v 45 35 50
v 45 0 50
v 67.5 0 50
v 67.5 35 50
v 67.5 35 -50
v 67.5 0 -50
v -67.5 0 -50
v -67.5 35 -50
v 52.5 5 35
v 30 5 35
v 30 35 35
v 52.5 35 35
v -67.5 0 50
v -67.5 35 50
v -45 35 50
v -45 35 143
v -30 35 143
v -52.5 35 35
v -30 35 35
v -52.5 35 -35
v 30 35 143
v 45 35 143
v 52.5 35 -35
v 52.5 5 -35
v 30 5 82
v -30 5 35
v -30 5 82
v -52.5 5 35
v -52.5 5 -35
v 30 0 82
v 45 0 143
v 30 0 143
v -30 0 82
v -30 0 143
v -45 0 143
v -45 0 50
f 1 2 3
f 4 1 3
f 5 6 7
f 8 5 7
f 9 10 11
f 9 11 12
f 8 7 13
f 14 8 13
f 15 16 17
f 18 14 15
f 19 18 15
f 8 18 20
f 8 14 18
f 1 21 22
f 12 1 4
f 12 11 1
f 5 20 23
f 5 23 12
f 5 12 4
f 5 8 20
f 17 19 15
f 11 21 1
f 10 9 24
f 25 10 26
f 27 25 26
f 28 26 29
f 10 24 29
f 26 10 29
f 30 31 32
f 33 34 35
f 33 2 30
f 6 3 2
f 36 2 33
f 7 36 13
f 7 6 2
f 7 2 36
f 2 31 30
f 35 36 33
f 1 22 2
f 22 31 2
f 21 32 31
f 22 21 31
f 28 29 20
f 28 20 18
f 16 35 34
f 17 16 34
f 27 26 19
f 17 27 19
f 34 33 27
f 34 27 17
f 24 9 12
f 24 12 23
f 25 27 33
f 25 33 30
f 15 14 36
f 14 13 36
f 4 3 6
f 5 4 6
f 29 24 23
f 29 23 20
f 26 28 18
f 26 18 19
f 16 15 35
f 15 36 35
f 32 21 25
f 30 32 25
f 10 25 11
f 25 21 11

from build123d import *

# Parameters (mm, degrees)
BOSS_EXTRUDE1_DEPTH = 5
BOSS_EXTRUDE2_DEPTH = 30
SKETCH3_W           = 60
SKETCH3_H           = 61
CUT_EXTRUDE1_DEPTH  = 162.957556168


with BuildPart() as part:
    # Sketch1 → Boss-Extrude1 (new body)
    with BuildSketch(Plane(origin=(0, 0, 0), x_dir=(1, 0, 0), z_dir=(0, 1, 0))):
        Polygon((67.5, -50), (45, -50), (45, -143), (-45, -143), (-45, -50), (-67.5, -50), (-67.5, 50), (67.5, 50), align=None)
    extrude(amount=BOSS_EXTRUDE1_DEPTH)

    # Sketch2 → Boss-Extrude2 (add)
    with BuildSketch(Plane(origin=(0, 5, 0), x_dir=(1, 0, 0), z_dir=(0, 1, 0))):
        Polygon((-67.5, 50), (-67.5, -50), (-45, -50), (-45, -143), (45, -143), (45, -50), (67.5, -50), (67.5, 50), align=None)
        Polygon((52.5, 35), (-52.5, 35), (-52.5, -35), (-30, -35), (-30, -128), (30, -128), (30, -35), (52.5, -35), align=None, mode=Mode.SUBTRACT)
    extrude(amount=BOSS_EXTRUDE2_DEPTH)

    # Sketch3 → Cut-Extrude1 (cut, through all)
    with BuildSketch(Plane(origin=(0, 35, 0), x_dir=(1, 0, 0), z_dir=(0, 1, 0))):
        with Locations((0, -112.5)):
            Rectangle(SKETCH3_W, SKETCH3_H)
    extrude(amount=-CUT_EXTRUDE1_DEPTH, mode=Mode.SUBTRACT)


solid = part.part
